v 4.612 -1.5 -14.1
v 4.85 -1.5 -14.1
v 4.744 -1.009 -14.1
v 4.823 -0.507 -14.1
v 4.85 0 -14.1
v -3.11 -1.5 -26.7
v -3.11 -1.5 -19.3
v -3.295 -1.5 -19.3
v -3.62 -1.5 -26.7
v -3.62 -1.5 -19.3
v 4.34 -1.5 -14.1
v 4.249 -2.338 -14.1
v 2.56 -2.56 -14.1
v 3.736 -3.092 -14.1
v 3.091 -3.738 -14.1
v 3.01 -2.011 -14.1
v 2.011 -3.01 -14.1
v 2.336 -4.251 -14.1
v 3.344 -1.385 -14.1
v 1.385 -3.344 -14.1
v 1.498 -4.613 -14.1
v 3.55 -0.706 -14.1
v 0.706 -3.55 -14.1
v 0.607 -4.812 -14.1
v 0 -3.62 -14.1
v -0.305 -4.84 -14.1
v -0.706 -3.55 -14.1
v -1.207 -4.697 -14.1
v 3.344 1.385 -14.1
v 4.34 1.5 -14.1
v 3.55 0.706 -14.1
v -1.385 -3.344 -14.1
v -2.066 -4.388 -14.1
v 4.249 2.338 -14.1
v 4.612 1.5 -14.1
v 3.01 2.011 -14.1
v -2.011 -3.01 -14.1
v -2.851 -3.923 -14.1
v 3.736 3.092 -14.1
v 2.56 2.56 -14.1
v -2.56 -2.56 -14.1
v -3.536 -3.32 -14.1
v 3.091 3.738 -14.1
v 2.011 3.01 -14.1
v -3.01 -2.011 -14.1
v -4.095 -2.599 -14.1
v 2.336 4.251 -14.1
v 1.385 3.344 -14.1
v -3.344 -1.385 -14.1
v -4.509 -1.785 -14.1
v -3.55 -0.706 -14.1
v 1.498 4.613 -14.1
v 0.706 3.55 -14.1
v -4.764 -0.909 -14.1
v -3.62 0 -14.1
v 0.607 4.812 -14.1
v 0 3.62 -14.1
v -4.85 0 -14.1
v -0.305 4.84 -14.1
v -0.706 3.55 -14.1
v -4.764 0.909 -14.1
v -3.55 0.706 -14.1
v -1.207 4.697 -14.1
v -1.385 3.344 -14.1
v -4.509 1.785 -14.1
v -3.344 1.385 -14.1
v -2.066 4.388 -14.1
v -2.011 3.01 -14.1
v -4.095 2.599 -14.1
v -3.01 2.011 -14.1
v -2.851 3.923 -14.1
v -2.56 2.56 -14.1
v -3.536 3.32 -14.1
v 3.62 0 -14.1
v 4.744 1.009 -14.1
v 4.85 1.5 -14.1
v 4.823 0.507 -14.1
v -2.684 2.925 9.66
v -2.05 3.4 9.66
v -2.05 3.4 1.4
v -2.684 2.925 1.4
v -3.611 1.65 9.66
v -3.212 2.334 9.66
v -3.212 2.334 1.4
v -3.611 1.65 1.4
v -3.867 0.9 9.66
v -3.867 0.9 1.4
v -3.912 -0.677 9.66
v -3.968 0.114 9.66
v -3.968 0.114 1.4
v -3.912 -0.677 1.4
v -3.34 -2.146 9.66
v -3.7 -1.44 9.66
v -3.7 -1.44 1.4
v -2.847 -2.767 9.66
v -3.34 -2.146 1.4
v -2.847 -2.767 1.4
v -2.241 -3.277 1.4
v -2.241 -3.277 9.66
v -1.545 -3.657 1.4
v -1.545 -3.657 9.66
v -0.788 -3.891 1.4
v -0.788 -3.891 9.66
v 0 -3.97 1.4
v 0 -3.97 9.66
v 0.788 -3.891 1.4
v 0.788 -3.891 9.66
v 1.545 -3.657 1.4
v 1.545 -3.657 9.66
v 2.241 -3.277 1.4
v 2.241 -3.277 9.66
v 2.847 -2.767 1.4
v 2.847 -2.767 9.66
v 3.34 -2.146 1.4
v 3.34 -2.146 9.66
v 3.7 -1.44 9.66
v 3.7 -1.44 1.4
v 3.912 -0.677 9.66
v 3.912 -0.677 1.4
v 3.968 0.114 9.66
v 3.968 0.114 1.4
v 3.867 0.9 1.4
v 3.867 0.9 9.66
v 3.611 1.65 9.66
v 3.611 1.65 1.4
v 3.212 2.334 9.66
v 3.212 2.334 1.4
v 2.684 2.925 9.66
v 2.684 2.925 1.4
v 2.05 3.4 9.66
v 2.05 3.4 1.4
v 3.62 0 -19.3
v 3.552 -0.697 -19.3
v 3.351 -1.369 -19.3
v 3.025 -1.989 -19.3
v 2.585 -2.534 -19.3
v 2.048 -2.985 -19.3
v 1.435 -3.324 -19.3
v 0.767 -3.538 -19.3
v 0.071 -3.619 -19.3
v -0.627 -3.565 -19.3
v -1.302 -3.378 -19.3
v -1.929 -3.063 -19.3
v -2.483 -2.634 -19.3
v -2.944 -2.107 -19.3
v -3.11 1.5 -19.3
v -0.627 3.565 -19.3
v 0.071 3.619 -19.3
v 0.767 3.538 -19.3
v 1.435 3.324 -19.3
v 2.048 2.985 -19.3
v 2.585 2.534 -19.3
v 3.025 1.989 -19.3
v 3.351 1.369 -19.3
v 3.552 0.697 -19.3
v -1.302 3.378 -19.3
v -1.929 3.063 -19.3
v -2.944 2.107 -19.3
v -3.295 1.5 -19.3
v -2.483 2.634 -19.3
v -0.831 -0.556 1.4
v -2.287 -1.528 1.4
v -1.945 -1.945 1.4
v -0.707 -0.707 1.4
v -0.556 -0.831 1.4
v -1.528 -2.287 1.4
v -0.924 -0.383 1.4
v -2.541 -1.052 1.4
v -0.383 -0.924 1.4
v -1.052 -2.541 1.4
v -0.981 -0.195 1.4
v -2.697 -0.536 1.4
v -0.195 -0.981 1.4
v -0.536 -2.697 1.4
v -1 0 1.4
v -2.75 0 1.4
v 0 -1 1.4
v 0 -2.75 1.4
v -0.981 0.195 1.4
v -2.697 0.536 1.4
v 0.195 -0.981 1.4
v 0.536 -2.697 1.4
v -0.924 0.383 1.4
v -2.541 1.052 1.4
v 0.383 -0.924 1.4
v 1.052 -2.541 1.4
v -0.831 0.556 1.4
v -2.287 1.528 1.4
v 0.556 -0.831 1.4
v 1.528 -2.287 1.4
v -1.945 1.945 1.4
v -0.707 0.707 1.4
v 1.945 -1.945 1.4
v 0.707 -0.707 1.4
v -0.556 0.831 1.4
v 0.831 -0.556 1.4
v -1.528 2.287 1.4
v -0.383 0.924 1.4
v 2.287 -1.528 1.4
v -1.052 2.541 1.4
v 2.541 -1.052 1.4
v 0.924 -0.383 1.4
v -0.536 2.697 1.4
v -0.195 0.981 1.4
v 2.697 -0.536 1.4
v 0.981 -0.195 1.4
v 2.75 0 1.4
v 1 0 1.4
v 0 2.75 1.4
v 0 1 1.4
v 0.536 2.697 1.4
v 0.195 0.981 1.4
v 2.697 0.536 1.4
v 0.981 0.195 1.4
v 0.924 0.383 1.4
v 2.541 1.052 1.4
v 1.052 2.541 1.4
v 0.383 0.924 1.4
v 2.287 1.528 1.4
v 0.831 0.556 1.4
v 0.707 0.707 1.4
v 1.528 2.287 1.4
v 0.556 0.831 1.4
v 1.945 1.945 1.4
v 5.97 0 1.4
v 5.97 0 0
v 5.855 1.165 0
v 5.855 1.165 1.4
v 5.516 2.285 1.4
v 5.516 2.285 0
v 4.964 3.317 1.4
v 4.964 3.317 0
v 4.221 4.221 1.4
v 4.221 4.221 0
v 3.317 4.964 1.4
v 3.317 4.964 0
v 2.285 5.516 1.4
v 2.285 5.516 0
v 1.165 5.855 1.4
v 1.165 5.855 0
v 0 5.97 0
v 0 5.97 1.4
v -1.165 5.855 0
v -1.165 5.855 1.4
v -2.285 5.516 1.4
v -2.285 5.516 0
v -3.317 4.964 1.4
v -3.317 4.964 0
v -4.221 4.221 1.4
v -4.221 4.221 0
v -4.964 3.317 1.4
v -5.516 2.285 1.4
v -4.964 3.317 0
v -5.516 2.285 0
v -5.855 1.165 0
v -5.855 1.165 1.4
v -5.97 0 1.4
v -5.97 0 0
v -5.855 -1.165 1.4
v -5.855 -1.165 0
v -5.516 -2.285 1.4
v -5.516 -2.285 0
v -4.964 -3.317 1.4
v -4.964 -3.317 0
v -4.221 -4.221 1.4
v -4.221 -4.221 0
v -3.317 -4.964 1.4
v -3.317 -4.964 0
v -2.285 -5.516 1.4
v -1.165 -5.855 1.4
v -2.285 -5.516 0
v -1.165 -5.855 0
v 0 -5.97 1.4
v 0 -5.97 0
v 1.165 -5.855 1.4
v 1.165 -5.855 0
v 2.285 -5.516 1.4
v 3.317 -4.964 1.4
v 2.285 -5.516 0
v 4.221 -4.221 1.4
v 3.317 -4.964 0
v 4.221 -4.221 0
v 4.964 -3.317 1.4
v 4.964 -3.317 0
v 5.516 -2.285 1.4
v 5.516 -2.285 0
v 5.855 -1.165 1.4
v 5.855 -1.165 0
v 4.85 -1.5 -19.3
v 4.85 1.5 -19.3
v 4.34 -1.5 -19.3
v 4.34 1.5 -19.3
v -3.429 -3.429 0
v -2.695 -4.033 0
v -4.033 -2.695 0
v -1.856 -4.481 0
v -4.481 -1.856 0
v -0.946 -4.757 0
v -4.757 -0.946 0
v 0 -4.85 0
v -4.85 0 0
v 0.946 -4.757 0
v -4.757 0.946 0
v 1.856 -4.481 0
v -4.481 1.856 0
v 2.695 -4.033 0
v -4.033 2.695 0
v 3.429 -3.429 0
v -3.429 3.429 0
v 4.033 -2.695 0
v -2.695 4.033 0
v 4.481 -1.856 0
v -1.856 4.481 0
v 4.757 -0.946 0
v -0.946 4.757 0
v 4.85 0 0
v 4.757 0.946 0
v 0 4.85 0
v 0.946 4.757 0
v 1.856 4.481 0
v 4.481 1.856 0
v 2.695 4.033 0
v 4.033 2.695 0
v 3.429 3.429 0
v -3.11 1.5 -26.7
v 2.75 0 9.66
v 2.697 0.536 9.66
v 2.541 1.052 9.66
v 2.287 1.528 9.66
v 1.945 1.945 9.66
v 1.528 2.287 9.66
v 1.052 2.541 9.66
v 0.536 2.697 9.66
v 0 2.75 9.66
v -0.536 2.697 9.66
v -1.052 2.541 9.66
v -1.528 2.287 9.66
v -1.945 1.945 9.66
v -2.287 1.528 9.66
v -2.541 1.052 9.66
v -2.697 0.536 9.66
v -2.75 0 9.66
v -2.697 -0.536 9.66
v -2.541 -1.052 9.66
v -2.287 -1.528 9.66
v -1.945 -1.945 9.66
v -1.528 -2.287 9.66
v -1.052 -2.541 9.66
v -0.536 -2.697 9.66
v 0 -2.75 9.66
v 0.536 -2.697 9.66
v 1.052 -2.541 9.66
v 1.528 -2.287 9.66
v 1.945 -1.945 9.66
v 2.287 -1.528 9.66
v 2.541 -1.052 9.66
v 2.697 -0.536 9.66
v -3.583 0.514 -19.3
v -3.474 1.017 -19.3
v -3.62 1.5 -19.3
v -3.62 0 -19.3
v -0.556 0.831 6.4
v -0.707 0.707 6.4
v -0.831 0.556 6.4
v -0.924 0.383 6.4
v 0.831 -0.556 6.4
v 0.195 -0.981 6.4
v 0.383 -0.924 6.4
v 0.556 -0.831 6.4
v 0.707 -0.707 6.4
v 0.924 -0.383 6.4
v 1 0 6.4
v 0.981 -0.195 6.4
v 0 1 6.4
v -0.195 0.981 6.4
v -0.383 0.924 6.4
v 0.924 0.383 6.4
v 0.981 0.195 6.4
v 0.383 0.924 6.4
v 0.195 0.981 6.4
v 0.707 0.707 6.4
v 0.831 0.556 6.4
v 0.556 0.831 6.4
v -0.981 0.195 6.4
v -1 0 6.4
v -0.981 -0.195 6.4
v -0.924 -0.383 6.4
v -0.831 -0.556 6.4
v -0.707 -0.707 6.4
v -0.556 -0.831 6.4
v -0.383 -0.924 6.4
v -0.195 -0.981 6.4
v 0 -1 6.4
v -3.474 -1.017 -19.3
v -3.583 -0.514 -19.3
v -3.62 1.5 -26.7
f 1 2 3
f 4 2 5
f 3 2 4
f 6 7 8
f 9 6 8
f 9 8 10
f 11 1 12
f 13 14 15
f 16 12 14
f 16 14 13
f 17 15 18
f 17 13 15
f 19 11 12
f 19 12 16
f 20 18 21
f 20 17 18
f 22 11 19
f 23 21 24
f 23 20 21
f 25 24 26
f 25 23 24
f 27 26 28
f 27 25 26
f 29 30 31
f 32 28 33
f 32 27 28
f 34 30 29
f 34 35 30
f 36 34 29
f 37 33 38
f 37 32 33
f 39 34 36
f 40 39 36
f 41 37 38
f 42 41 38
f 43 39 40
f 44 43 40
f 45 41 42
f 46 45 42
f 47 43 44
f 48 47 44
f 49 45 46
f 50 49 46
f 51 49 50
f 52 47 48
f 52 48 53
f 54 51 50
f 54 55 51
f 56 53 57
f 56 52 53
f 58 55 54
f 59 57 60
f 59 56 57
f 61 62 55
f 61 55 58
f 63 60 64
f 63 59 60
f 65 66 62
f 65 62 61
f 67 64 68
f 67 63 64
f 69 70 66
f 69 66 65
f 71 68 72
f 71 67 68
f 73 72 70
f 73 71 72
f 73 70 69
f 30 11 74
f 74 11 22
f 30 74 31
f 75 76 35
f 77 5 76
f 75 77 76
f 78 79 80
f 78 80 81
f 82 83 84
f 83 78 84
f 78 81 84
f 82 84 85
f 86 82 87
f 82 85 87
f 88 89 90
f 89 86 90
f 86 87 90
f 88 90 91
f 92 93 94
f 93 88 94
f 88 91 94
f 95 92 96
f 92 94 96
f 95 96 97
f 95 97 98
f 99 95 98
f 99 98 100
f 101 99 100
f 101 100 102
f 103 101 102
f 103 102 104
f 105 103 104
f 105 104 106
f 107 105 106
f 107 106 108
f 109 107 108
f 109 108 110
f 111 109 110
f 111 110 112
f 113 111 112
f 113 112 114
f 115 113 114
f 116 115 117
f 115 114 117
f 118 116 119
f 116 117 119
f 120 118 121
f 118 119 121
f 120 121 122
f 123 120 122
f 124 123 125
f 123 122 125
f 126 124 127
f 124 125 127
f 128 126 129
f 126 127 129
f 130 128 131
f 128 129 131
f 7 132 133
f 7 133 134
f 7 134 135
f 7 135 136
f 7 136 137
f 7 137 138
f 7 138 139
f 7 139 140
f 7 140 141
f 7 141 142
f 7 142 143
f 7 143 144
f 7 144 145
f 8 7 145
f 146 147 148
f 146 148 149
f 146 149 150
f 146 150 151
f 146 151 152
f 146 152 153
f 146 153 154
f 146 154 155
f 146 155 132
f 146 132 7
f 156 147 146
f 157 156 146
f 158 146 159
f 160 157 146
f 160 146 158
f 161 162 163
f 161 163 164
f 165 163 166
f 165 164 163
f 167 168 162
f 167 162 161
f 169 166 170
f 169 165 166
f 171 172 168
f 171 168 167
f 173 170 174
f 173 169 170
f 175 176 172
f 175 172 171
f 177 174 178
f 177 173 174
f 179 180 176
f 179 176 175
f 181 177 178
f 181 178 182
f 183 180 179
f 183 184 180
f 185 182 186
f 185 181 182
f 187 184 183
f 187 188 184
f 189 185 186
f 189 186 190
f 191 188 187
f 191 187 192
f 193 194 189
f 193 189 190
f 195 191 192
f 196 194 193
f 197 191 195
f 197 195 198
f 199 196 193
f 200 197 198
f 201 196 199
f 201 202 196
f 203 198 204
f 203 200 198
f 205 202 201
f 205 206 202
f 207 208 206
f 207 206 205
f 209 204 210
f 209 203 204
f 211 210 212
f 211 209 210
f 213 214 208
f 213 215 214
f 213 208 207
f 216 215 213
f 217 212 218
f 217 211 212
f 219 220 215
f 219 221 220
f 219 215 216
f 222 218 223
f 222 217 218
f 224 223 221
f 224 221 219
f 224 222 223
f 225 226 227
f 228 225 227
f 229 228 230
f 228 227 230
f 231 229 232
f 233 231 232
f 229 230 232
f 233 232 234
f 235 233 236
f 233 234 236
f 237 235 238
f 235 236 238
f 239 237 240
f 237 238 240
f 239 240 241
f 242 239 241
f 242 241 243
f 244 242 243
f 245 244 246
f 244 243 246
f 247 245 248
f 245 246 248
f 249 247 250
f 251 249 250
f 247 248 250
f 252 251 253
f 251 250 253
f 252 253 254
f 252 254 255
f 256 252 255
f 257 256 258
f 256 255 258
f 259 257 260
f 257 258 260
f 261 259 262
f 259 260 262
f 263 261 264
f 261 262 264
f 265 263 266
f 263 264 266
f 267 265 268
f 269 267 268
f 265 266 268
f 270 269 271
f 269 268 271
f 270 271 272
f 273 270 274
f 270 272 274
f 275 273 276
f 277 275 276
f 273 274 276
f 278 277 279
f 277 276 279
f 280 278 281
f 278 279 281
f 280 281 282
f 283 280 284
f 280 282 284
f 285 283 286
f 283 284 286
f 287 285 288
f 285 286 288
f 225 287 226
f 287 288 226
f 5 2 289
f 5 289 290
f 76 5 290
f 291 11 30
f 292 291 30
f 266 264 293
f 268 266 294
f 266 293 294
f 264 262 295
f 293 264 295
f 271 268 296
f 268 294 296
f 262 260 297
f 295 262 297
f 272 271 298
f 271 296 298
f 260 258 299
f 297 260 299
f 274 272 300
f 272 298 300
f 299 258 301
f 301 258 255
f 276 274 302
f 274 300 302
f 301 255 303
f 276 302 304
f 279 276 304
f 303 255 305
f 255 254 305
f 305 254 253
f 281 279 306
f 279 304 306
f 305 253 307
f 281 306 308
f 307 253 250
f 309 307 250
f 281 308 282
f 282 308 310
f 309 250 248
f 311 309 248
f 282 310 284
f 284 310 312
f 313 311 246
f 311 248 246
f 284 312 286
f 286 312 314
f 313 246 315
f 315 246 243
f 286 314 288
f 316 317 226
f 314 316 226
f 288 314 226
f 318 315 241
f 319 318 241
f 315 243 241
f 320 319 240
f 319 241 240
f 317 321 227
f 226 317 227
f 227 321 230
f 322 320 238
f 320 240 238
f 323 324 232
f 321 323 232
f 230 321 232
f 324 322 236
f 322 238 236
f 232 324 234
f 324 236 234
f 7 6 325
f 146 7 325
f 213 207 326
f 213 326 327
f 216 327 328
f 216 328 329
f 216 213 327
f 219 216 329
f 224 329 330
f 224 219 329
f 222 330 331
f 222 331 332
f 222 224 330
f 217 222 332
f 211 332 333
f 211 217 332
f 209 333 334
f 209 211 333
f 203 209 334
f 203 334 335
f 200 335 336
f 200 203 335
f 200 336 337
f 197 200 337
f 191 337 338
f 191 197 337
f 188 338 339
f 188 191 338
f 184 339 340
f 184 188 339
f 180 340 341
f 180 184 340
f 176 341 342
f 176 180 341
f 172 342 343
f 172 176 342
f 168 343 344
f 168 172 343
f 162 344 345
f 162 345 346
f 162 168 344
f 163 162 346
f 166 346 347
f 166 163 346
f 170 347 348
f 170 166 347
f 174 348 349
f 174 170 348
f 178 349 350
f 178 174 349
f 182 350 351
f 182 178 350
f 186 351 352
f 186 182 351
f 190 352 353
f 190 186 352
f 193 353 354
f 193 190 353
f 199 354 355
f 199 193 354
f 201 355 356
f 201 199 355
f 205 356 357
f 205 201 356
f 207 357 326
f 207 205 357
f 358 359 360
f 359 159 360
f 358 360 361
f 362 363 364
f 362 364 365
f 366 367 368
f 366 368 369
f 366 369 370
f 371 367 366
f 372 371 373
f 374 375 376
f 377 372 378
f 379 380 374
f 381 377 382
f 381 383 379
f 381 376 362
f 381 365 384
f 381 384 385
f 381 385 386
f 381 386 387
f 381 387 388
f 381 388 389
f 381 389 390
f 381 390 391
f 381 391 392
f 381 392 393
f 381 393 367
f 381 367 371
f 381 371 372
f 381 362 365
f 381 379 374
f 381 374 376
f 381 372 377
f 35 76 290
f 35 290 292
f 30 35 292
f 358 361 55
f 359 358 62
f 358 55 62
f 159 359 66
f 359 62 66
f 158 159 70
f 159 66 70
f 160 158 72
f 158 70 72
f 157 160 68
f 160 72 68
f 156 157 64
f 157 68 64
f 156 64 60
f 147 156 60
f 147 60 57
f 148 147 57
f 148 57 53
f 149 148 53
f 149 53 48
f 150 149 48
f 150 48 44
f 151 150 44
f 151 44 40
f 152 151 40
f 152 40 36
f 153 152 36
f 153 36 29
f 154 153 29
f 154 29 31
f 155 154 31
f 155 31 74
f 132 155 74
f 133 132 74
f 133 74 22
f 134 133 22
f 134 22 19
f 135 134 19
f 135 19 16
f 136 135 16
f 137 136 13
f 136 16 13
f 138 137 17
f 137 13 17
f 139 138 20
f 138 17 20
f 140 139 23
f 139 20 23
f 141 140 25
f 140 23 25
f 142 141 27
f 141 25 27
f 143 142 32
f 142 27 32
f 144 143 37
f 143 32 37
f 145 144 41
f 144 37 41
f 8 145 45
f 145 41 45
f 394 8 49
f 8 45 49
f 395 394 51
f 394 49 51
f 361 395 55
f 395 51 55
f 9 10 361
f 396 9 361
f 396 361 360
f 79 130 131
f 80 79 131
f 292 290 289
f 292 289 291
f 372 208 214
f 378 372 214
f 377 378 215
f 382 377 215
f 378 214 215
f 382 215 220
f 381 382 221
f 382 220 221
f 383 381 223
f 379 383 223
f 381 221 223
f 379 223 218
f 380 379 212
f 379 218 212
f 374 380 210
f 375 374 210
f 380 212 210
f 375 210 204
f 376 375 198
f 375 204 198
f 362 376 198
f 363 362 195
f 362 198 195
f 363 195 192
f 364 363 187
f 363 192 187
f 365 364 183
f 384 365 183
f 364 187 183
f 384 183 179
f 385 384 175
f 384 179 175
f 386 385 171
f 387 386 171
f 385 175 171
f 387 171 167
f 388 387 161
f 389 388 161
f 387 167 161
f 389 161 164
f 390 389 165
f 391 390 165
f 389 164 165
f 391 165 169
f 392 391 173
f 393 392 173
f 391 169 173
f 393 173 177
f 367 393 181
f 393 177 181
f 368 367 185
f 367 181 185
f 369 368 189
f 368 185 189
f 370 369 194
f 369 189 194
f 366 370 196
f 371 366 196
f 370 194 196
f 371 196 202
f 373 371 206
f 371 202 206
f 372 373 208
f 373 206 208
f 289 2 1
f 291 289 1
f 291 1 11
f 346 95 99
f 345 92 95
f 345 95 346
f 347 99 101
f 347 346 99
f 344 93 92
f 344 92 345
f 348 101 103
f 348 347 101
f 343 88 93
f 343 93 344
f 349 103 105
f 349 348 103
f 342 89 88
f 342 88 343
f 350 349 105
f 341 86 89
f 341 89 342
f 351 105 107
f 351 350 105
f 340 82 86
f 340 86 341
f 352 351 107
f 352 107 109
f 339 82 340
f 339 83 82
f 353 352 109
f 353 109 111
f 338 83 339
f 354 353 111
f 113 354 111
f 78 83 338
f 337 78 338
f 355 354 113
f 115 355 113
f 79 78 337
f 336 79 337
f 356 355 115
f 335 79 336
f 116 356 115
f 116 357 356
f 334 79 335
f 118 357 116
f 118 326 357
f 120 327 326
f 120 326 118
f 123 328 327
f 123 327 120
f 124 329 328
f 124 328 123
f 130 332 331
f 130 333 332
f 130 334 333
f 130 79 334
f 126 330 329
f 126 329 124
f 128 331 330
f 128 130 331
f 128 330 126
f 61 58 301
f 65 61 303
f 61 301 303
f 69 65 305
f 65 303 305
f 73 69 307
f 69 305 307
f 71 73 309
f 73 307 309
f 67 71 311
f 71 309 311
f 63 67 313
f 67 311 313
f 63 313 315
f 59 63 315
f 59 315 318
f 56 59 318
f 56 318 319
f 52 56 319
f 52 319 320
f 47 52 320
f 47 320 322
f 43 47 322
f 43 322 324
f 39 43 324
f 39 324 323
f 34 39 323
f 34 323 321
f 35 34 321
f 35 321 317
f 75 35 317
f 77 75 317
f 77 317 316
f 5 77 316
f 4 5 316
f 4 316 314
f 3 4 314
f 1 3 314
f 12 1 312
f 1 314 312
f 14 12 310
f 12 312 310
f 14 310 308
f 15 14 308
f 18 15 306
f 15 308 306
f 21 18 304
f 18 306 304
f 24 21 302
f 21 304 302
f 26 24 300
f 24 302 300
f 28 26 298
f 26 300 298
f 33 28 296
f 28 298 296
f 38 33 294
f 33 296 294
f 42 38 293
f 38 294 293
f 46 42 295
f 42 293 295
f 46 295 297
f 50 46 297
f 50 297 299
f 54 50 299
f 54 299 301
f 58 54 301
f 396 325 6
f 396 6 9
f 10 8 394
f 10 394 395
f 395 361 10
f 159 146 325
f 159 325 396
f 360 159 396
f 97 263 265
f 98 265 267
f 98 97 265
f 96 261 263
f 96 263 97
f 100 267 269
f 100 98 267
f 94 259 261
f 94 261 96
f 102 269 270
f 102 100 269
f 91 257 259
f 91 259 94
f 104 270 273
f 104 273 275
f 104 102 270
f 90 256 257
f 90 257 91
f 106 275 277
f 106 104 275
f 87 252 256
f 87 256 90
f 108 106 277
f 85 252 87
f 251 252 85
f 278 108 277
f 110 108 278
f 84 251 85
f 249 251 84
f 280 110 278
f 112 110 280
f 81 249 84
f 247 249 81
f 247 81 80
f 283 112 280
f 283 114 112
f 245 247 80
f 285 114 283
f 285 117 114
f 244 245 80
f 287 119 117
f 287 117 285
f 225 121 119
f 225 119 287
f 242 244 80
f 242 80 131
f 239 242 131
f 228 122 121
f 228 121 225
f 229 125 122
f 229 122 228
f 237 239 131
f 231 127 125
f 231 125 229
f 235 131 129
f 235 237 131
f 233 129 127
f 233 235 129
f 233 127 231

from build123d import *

# Parameters (mm, degrees)
ESQUISSE1_R                              = 5.97
BOSS_EXTRU_1_DEPTH                       = 1.4
ESQUISSE2_R                              = 4.85
BOSS_EXTRU_2_DEPTH                       = 14.1
ESQUISSE3_R                              = 3.97
ESQUISSE3_R_2                            = 2.75
BOSS_EXTRU_3_DEPTH                       = 8.26
ESQUISSE4_R                              = 1
BOSS_EXTRU_4_DEPTH                       = 5
ENL_V_MAT_EXTRU_1_REACH                  = 18.434
ENL_V_MAT_EXTRU_1_END_RADIUS             = 3.97
ESQUISSE5_W                              = 8.26
ESQUISSE5_H                              = 0.57
ENL_V_MAT_EXTRU_1_DIRECTION_2_REACH      = 18.434
ENL_V_MAT_EXTRU_1_DIRECTION_2_END_RADIUS = 3.97
ESQUISSE6_R                              = 3.62
ESQUISSE6_W                              = 0.51
ESQUISSE6_H                              = 3
BOSS_EXTRU_5_DEPTH                       = 5.2
ESQUISSE7_W                              = 0.51
ESQUISSE7_H                              = 3
BOSS_EXTRU_6_DEPTH                       = 7.4


with BuildPart() as part:
    # Esquisse1 → Boss.-Extru.1 (new body)
    with BuildSketch(Plane.XY):
        Circle(ESQUISSE1_R)
    extrude(amount=BOSS_EXTRU_1_DEPTH)

    # Esquisse2 → Boss.-Extru.2 (add)
    with BuildSketch(Plane(origin=(0, 0, 0), x_dir=(-1, 0, 0), z_dir=(0, 0, -1))):
        Circle(ESQUISSE2_R)
    extrude(amount=BOSS_EXTRU_2_DEPTH)

    # Esquisse3 → Boss.-Extru.3 (add)
    with BuildSketch(Plane.XY.offset(1.4)):
        Circle(ESQUISSE3_R)
        Circle(ESQUISSE3_R_2, mode=Mode.SUBTRACT)
    extrude(amount=BOSS_EXTRU_3_DEPTH)

    # Esquisse4 → Boss.-Extru.4 (add)
    with BuildSketch(Plane.XY.offset(1.4)):
        Circle(ESQUISSE4_R)
    extrude(amount=BOSS_EXTRU_4_DEPTH)

    # Enlèv. mat.-Extru.1: up to this cylinder (the profile starts inside it)
    enl_v_mat_extru_1_end = Plane(origin=(0, 0, 5.53), z_dir=(0, 0, -1)) * Cylinder(ENL_V_MAT_EXTRU_1_END_RADIUS, 45.808, mode=Mode.PRIVATE)
    # Esquisse5 → Enlèv. mat.-Extru.1 (cut, up to the surface)
    with BuildSketch(Plane(origin=(0, 0, 0), x_dir=(0, 0, -1), z_dir=(1, 0, 0)), mode=Mode.PRIVATE) as enl_v_mat_extru_1_sk1:
        with Locations((-5.53, 3.685)):
            Rectangle(ESQUISSE5_W, ESQUISSE5_H)
    enl_v_mat_extru_1_tool1 = extrude(enl_v_mat_extru_1_sk1.sketch, amount=-ENL_V_MAT_EXTRU_1_REACH, mode=Mode.PRIVATE) & enl_v_mat_extru_1_end
    add(enl_v_mat_extru_1_tool1.solids().sort_by_distance((0, 3.685, 5.53))[0], mode=Mode.SUBTRACT)

    # Enlèv. mat.-Extru.1 direction 2: up to this cylinder (the profile starts inside it)
    enl_v_mat_extru_1_direction_2_end = Plane(origin=(0, 0, 5.53), z_dir=(0, 0, -1)) * Cylinder(ENL_V_MAT_EXTRU_1_DIRECTION_2_END_RADIUS, 45.808, mode=Mode.PRIVATE)
    # Esquisse5 → Enlèv. mat.-Extru.1 direction 2 (cut, up to the surface)
    with BuildSketch(Plane(origin=(0, 0, 0), x_dir=(0, 0, -1), z_dir=(1, 0, 0)), mode=Mode.PRIVATE) as enl_v_mat_extru_1_direction_2_sk1:
        with Locations((-5.53, 3.685)):
            Rectangle(ESQUISSE5_W, ESQUISSE5_H)
    enl_v_mat_extru_1_direction_2_tool1 = extrude(enl_v_mat_extru_1_direction_2_sk1.sketch, amount=ENL_V_MAT_EXTRU_1_DIRECTION_2_REACH, mode=Mode.PRIVATE) & enl_v_mat_extru_1_direction_2_end
    add(enl_v_mat_extru_1_direction_2_tool1.solids().sort_by_distance((0, 3.685, 5.53))[0], mode=Mode.SUBTRACT)

    # Esquisse6 → Boss.-Extru.5 (add)
    with BuildSketch(Plane(origin=(0, 0, -14.1), x_dir=(-1, 0, 0), z_dir=(0, 0, -1))):
        Circle(ESQUISSE6_R)
        with Locations((-4.595, 0)):
            Rectangle(ESQUISSE6_W, ESQUISSE6_H)
    extrude(amount=BOSS_EXTRU_5_DEPTH)

    # Esquisse7 → Boss.-Extru.6 (add)
    with BuildSketch(Plane(origin=(0, 0, -19.3), x_dir=(-1, 0, 0), z_dir=(0, 0, -1))):
        with Locations((3.365, 0)):
            Rectangle(ESQUISSE7_W, ESQUISSE7_H)
    extrude(amount=BOSS_EXTRU_6_DEPTH)


solid = part.part
